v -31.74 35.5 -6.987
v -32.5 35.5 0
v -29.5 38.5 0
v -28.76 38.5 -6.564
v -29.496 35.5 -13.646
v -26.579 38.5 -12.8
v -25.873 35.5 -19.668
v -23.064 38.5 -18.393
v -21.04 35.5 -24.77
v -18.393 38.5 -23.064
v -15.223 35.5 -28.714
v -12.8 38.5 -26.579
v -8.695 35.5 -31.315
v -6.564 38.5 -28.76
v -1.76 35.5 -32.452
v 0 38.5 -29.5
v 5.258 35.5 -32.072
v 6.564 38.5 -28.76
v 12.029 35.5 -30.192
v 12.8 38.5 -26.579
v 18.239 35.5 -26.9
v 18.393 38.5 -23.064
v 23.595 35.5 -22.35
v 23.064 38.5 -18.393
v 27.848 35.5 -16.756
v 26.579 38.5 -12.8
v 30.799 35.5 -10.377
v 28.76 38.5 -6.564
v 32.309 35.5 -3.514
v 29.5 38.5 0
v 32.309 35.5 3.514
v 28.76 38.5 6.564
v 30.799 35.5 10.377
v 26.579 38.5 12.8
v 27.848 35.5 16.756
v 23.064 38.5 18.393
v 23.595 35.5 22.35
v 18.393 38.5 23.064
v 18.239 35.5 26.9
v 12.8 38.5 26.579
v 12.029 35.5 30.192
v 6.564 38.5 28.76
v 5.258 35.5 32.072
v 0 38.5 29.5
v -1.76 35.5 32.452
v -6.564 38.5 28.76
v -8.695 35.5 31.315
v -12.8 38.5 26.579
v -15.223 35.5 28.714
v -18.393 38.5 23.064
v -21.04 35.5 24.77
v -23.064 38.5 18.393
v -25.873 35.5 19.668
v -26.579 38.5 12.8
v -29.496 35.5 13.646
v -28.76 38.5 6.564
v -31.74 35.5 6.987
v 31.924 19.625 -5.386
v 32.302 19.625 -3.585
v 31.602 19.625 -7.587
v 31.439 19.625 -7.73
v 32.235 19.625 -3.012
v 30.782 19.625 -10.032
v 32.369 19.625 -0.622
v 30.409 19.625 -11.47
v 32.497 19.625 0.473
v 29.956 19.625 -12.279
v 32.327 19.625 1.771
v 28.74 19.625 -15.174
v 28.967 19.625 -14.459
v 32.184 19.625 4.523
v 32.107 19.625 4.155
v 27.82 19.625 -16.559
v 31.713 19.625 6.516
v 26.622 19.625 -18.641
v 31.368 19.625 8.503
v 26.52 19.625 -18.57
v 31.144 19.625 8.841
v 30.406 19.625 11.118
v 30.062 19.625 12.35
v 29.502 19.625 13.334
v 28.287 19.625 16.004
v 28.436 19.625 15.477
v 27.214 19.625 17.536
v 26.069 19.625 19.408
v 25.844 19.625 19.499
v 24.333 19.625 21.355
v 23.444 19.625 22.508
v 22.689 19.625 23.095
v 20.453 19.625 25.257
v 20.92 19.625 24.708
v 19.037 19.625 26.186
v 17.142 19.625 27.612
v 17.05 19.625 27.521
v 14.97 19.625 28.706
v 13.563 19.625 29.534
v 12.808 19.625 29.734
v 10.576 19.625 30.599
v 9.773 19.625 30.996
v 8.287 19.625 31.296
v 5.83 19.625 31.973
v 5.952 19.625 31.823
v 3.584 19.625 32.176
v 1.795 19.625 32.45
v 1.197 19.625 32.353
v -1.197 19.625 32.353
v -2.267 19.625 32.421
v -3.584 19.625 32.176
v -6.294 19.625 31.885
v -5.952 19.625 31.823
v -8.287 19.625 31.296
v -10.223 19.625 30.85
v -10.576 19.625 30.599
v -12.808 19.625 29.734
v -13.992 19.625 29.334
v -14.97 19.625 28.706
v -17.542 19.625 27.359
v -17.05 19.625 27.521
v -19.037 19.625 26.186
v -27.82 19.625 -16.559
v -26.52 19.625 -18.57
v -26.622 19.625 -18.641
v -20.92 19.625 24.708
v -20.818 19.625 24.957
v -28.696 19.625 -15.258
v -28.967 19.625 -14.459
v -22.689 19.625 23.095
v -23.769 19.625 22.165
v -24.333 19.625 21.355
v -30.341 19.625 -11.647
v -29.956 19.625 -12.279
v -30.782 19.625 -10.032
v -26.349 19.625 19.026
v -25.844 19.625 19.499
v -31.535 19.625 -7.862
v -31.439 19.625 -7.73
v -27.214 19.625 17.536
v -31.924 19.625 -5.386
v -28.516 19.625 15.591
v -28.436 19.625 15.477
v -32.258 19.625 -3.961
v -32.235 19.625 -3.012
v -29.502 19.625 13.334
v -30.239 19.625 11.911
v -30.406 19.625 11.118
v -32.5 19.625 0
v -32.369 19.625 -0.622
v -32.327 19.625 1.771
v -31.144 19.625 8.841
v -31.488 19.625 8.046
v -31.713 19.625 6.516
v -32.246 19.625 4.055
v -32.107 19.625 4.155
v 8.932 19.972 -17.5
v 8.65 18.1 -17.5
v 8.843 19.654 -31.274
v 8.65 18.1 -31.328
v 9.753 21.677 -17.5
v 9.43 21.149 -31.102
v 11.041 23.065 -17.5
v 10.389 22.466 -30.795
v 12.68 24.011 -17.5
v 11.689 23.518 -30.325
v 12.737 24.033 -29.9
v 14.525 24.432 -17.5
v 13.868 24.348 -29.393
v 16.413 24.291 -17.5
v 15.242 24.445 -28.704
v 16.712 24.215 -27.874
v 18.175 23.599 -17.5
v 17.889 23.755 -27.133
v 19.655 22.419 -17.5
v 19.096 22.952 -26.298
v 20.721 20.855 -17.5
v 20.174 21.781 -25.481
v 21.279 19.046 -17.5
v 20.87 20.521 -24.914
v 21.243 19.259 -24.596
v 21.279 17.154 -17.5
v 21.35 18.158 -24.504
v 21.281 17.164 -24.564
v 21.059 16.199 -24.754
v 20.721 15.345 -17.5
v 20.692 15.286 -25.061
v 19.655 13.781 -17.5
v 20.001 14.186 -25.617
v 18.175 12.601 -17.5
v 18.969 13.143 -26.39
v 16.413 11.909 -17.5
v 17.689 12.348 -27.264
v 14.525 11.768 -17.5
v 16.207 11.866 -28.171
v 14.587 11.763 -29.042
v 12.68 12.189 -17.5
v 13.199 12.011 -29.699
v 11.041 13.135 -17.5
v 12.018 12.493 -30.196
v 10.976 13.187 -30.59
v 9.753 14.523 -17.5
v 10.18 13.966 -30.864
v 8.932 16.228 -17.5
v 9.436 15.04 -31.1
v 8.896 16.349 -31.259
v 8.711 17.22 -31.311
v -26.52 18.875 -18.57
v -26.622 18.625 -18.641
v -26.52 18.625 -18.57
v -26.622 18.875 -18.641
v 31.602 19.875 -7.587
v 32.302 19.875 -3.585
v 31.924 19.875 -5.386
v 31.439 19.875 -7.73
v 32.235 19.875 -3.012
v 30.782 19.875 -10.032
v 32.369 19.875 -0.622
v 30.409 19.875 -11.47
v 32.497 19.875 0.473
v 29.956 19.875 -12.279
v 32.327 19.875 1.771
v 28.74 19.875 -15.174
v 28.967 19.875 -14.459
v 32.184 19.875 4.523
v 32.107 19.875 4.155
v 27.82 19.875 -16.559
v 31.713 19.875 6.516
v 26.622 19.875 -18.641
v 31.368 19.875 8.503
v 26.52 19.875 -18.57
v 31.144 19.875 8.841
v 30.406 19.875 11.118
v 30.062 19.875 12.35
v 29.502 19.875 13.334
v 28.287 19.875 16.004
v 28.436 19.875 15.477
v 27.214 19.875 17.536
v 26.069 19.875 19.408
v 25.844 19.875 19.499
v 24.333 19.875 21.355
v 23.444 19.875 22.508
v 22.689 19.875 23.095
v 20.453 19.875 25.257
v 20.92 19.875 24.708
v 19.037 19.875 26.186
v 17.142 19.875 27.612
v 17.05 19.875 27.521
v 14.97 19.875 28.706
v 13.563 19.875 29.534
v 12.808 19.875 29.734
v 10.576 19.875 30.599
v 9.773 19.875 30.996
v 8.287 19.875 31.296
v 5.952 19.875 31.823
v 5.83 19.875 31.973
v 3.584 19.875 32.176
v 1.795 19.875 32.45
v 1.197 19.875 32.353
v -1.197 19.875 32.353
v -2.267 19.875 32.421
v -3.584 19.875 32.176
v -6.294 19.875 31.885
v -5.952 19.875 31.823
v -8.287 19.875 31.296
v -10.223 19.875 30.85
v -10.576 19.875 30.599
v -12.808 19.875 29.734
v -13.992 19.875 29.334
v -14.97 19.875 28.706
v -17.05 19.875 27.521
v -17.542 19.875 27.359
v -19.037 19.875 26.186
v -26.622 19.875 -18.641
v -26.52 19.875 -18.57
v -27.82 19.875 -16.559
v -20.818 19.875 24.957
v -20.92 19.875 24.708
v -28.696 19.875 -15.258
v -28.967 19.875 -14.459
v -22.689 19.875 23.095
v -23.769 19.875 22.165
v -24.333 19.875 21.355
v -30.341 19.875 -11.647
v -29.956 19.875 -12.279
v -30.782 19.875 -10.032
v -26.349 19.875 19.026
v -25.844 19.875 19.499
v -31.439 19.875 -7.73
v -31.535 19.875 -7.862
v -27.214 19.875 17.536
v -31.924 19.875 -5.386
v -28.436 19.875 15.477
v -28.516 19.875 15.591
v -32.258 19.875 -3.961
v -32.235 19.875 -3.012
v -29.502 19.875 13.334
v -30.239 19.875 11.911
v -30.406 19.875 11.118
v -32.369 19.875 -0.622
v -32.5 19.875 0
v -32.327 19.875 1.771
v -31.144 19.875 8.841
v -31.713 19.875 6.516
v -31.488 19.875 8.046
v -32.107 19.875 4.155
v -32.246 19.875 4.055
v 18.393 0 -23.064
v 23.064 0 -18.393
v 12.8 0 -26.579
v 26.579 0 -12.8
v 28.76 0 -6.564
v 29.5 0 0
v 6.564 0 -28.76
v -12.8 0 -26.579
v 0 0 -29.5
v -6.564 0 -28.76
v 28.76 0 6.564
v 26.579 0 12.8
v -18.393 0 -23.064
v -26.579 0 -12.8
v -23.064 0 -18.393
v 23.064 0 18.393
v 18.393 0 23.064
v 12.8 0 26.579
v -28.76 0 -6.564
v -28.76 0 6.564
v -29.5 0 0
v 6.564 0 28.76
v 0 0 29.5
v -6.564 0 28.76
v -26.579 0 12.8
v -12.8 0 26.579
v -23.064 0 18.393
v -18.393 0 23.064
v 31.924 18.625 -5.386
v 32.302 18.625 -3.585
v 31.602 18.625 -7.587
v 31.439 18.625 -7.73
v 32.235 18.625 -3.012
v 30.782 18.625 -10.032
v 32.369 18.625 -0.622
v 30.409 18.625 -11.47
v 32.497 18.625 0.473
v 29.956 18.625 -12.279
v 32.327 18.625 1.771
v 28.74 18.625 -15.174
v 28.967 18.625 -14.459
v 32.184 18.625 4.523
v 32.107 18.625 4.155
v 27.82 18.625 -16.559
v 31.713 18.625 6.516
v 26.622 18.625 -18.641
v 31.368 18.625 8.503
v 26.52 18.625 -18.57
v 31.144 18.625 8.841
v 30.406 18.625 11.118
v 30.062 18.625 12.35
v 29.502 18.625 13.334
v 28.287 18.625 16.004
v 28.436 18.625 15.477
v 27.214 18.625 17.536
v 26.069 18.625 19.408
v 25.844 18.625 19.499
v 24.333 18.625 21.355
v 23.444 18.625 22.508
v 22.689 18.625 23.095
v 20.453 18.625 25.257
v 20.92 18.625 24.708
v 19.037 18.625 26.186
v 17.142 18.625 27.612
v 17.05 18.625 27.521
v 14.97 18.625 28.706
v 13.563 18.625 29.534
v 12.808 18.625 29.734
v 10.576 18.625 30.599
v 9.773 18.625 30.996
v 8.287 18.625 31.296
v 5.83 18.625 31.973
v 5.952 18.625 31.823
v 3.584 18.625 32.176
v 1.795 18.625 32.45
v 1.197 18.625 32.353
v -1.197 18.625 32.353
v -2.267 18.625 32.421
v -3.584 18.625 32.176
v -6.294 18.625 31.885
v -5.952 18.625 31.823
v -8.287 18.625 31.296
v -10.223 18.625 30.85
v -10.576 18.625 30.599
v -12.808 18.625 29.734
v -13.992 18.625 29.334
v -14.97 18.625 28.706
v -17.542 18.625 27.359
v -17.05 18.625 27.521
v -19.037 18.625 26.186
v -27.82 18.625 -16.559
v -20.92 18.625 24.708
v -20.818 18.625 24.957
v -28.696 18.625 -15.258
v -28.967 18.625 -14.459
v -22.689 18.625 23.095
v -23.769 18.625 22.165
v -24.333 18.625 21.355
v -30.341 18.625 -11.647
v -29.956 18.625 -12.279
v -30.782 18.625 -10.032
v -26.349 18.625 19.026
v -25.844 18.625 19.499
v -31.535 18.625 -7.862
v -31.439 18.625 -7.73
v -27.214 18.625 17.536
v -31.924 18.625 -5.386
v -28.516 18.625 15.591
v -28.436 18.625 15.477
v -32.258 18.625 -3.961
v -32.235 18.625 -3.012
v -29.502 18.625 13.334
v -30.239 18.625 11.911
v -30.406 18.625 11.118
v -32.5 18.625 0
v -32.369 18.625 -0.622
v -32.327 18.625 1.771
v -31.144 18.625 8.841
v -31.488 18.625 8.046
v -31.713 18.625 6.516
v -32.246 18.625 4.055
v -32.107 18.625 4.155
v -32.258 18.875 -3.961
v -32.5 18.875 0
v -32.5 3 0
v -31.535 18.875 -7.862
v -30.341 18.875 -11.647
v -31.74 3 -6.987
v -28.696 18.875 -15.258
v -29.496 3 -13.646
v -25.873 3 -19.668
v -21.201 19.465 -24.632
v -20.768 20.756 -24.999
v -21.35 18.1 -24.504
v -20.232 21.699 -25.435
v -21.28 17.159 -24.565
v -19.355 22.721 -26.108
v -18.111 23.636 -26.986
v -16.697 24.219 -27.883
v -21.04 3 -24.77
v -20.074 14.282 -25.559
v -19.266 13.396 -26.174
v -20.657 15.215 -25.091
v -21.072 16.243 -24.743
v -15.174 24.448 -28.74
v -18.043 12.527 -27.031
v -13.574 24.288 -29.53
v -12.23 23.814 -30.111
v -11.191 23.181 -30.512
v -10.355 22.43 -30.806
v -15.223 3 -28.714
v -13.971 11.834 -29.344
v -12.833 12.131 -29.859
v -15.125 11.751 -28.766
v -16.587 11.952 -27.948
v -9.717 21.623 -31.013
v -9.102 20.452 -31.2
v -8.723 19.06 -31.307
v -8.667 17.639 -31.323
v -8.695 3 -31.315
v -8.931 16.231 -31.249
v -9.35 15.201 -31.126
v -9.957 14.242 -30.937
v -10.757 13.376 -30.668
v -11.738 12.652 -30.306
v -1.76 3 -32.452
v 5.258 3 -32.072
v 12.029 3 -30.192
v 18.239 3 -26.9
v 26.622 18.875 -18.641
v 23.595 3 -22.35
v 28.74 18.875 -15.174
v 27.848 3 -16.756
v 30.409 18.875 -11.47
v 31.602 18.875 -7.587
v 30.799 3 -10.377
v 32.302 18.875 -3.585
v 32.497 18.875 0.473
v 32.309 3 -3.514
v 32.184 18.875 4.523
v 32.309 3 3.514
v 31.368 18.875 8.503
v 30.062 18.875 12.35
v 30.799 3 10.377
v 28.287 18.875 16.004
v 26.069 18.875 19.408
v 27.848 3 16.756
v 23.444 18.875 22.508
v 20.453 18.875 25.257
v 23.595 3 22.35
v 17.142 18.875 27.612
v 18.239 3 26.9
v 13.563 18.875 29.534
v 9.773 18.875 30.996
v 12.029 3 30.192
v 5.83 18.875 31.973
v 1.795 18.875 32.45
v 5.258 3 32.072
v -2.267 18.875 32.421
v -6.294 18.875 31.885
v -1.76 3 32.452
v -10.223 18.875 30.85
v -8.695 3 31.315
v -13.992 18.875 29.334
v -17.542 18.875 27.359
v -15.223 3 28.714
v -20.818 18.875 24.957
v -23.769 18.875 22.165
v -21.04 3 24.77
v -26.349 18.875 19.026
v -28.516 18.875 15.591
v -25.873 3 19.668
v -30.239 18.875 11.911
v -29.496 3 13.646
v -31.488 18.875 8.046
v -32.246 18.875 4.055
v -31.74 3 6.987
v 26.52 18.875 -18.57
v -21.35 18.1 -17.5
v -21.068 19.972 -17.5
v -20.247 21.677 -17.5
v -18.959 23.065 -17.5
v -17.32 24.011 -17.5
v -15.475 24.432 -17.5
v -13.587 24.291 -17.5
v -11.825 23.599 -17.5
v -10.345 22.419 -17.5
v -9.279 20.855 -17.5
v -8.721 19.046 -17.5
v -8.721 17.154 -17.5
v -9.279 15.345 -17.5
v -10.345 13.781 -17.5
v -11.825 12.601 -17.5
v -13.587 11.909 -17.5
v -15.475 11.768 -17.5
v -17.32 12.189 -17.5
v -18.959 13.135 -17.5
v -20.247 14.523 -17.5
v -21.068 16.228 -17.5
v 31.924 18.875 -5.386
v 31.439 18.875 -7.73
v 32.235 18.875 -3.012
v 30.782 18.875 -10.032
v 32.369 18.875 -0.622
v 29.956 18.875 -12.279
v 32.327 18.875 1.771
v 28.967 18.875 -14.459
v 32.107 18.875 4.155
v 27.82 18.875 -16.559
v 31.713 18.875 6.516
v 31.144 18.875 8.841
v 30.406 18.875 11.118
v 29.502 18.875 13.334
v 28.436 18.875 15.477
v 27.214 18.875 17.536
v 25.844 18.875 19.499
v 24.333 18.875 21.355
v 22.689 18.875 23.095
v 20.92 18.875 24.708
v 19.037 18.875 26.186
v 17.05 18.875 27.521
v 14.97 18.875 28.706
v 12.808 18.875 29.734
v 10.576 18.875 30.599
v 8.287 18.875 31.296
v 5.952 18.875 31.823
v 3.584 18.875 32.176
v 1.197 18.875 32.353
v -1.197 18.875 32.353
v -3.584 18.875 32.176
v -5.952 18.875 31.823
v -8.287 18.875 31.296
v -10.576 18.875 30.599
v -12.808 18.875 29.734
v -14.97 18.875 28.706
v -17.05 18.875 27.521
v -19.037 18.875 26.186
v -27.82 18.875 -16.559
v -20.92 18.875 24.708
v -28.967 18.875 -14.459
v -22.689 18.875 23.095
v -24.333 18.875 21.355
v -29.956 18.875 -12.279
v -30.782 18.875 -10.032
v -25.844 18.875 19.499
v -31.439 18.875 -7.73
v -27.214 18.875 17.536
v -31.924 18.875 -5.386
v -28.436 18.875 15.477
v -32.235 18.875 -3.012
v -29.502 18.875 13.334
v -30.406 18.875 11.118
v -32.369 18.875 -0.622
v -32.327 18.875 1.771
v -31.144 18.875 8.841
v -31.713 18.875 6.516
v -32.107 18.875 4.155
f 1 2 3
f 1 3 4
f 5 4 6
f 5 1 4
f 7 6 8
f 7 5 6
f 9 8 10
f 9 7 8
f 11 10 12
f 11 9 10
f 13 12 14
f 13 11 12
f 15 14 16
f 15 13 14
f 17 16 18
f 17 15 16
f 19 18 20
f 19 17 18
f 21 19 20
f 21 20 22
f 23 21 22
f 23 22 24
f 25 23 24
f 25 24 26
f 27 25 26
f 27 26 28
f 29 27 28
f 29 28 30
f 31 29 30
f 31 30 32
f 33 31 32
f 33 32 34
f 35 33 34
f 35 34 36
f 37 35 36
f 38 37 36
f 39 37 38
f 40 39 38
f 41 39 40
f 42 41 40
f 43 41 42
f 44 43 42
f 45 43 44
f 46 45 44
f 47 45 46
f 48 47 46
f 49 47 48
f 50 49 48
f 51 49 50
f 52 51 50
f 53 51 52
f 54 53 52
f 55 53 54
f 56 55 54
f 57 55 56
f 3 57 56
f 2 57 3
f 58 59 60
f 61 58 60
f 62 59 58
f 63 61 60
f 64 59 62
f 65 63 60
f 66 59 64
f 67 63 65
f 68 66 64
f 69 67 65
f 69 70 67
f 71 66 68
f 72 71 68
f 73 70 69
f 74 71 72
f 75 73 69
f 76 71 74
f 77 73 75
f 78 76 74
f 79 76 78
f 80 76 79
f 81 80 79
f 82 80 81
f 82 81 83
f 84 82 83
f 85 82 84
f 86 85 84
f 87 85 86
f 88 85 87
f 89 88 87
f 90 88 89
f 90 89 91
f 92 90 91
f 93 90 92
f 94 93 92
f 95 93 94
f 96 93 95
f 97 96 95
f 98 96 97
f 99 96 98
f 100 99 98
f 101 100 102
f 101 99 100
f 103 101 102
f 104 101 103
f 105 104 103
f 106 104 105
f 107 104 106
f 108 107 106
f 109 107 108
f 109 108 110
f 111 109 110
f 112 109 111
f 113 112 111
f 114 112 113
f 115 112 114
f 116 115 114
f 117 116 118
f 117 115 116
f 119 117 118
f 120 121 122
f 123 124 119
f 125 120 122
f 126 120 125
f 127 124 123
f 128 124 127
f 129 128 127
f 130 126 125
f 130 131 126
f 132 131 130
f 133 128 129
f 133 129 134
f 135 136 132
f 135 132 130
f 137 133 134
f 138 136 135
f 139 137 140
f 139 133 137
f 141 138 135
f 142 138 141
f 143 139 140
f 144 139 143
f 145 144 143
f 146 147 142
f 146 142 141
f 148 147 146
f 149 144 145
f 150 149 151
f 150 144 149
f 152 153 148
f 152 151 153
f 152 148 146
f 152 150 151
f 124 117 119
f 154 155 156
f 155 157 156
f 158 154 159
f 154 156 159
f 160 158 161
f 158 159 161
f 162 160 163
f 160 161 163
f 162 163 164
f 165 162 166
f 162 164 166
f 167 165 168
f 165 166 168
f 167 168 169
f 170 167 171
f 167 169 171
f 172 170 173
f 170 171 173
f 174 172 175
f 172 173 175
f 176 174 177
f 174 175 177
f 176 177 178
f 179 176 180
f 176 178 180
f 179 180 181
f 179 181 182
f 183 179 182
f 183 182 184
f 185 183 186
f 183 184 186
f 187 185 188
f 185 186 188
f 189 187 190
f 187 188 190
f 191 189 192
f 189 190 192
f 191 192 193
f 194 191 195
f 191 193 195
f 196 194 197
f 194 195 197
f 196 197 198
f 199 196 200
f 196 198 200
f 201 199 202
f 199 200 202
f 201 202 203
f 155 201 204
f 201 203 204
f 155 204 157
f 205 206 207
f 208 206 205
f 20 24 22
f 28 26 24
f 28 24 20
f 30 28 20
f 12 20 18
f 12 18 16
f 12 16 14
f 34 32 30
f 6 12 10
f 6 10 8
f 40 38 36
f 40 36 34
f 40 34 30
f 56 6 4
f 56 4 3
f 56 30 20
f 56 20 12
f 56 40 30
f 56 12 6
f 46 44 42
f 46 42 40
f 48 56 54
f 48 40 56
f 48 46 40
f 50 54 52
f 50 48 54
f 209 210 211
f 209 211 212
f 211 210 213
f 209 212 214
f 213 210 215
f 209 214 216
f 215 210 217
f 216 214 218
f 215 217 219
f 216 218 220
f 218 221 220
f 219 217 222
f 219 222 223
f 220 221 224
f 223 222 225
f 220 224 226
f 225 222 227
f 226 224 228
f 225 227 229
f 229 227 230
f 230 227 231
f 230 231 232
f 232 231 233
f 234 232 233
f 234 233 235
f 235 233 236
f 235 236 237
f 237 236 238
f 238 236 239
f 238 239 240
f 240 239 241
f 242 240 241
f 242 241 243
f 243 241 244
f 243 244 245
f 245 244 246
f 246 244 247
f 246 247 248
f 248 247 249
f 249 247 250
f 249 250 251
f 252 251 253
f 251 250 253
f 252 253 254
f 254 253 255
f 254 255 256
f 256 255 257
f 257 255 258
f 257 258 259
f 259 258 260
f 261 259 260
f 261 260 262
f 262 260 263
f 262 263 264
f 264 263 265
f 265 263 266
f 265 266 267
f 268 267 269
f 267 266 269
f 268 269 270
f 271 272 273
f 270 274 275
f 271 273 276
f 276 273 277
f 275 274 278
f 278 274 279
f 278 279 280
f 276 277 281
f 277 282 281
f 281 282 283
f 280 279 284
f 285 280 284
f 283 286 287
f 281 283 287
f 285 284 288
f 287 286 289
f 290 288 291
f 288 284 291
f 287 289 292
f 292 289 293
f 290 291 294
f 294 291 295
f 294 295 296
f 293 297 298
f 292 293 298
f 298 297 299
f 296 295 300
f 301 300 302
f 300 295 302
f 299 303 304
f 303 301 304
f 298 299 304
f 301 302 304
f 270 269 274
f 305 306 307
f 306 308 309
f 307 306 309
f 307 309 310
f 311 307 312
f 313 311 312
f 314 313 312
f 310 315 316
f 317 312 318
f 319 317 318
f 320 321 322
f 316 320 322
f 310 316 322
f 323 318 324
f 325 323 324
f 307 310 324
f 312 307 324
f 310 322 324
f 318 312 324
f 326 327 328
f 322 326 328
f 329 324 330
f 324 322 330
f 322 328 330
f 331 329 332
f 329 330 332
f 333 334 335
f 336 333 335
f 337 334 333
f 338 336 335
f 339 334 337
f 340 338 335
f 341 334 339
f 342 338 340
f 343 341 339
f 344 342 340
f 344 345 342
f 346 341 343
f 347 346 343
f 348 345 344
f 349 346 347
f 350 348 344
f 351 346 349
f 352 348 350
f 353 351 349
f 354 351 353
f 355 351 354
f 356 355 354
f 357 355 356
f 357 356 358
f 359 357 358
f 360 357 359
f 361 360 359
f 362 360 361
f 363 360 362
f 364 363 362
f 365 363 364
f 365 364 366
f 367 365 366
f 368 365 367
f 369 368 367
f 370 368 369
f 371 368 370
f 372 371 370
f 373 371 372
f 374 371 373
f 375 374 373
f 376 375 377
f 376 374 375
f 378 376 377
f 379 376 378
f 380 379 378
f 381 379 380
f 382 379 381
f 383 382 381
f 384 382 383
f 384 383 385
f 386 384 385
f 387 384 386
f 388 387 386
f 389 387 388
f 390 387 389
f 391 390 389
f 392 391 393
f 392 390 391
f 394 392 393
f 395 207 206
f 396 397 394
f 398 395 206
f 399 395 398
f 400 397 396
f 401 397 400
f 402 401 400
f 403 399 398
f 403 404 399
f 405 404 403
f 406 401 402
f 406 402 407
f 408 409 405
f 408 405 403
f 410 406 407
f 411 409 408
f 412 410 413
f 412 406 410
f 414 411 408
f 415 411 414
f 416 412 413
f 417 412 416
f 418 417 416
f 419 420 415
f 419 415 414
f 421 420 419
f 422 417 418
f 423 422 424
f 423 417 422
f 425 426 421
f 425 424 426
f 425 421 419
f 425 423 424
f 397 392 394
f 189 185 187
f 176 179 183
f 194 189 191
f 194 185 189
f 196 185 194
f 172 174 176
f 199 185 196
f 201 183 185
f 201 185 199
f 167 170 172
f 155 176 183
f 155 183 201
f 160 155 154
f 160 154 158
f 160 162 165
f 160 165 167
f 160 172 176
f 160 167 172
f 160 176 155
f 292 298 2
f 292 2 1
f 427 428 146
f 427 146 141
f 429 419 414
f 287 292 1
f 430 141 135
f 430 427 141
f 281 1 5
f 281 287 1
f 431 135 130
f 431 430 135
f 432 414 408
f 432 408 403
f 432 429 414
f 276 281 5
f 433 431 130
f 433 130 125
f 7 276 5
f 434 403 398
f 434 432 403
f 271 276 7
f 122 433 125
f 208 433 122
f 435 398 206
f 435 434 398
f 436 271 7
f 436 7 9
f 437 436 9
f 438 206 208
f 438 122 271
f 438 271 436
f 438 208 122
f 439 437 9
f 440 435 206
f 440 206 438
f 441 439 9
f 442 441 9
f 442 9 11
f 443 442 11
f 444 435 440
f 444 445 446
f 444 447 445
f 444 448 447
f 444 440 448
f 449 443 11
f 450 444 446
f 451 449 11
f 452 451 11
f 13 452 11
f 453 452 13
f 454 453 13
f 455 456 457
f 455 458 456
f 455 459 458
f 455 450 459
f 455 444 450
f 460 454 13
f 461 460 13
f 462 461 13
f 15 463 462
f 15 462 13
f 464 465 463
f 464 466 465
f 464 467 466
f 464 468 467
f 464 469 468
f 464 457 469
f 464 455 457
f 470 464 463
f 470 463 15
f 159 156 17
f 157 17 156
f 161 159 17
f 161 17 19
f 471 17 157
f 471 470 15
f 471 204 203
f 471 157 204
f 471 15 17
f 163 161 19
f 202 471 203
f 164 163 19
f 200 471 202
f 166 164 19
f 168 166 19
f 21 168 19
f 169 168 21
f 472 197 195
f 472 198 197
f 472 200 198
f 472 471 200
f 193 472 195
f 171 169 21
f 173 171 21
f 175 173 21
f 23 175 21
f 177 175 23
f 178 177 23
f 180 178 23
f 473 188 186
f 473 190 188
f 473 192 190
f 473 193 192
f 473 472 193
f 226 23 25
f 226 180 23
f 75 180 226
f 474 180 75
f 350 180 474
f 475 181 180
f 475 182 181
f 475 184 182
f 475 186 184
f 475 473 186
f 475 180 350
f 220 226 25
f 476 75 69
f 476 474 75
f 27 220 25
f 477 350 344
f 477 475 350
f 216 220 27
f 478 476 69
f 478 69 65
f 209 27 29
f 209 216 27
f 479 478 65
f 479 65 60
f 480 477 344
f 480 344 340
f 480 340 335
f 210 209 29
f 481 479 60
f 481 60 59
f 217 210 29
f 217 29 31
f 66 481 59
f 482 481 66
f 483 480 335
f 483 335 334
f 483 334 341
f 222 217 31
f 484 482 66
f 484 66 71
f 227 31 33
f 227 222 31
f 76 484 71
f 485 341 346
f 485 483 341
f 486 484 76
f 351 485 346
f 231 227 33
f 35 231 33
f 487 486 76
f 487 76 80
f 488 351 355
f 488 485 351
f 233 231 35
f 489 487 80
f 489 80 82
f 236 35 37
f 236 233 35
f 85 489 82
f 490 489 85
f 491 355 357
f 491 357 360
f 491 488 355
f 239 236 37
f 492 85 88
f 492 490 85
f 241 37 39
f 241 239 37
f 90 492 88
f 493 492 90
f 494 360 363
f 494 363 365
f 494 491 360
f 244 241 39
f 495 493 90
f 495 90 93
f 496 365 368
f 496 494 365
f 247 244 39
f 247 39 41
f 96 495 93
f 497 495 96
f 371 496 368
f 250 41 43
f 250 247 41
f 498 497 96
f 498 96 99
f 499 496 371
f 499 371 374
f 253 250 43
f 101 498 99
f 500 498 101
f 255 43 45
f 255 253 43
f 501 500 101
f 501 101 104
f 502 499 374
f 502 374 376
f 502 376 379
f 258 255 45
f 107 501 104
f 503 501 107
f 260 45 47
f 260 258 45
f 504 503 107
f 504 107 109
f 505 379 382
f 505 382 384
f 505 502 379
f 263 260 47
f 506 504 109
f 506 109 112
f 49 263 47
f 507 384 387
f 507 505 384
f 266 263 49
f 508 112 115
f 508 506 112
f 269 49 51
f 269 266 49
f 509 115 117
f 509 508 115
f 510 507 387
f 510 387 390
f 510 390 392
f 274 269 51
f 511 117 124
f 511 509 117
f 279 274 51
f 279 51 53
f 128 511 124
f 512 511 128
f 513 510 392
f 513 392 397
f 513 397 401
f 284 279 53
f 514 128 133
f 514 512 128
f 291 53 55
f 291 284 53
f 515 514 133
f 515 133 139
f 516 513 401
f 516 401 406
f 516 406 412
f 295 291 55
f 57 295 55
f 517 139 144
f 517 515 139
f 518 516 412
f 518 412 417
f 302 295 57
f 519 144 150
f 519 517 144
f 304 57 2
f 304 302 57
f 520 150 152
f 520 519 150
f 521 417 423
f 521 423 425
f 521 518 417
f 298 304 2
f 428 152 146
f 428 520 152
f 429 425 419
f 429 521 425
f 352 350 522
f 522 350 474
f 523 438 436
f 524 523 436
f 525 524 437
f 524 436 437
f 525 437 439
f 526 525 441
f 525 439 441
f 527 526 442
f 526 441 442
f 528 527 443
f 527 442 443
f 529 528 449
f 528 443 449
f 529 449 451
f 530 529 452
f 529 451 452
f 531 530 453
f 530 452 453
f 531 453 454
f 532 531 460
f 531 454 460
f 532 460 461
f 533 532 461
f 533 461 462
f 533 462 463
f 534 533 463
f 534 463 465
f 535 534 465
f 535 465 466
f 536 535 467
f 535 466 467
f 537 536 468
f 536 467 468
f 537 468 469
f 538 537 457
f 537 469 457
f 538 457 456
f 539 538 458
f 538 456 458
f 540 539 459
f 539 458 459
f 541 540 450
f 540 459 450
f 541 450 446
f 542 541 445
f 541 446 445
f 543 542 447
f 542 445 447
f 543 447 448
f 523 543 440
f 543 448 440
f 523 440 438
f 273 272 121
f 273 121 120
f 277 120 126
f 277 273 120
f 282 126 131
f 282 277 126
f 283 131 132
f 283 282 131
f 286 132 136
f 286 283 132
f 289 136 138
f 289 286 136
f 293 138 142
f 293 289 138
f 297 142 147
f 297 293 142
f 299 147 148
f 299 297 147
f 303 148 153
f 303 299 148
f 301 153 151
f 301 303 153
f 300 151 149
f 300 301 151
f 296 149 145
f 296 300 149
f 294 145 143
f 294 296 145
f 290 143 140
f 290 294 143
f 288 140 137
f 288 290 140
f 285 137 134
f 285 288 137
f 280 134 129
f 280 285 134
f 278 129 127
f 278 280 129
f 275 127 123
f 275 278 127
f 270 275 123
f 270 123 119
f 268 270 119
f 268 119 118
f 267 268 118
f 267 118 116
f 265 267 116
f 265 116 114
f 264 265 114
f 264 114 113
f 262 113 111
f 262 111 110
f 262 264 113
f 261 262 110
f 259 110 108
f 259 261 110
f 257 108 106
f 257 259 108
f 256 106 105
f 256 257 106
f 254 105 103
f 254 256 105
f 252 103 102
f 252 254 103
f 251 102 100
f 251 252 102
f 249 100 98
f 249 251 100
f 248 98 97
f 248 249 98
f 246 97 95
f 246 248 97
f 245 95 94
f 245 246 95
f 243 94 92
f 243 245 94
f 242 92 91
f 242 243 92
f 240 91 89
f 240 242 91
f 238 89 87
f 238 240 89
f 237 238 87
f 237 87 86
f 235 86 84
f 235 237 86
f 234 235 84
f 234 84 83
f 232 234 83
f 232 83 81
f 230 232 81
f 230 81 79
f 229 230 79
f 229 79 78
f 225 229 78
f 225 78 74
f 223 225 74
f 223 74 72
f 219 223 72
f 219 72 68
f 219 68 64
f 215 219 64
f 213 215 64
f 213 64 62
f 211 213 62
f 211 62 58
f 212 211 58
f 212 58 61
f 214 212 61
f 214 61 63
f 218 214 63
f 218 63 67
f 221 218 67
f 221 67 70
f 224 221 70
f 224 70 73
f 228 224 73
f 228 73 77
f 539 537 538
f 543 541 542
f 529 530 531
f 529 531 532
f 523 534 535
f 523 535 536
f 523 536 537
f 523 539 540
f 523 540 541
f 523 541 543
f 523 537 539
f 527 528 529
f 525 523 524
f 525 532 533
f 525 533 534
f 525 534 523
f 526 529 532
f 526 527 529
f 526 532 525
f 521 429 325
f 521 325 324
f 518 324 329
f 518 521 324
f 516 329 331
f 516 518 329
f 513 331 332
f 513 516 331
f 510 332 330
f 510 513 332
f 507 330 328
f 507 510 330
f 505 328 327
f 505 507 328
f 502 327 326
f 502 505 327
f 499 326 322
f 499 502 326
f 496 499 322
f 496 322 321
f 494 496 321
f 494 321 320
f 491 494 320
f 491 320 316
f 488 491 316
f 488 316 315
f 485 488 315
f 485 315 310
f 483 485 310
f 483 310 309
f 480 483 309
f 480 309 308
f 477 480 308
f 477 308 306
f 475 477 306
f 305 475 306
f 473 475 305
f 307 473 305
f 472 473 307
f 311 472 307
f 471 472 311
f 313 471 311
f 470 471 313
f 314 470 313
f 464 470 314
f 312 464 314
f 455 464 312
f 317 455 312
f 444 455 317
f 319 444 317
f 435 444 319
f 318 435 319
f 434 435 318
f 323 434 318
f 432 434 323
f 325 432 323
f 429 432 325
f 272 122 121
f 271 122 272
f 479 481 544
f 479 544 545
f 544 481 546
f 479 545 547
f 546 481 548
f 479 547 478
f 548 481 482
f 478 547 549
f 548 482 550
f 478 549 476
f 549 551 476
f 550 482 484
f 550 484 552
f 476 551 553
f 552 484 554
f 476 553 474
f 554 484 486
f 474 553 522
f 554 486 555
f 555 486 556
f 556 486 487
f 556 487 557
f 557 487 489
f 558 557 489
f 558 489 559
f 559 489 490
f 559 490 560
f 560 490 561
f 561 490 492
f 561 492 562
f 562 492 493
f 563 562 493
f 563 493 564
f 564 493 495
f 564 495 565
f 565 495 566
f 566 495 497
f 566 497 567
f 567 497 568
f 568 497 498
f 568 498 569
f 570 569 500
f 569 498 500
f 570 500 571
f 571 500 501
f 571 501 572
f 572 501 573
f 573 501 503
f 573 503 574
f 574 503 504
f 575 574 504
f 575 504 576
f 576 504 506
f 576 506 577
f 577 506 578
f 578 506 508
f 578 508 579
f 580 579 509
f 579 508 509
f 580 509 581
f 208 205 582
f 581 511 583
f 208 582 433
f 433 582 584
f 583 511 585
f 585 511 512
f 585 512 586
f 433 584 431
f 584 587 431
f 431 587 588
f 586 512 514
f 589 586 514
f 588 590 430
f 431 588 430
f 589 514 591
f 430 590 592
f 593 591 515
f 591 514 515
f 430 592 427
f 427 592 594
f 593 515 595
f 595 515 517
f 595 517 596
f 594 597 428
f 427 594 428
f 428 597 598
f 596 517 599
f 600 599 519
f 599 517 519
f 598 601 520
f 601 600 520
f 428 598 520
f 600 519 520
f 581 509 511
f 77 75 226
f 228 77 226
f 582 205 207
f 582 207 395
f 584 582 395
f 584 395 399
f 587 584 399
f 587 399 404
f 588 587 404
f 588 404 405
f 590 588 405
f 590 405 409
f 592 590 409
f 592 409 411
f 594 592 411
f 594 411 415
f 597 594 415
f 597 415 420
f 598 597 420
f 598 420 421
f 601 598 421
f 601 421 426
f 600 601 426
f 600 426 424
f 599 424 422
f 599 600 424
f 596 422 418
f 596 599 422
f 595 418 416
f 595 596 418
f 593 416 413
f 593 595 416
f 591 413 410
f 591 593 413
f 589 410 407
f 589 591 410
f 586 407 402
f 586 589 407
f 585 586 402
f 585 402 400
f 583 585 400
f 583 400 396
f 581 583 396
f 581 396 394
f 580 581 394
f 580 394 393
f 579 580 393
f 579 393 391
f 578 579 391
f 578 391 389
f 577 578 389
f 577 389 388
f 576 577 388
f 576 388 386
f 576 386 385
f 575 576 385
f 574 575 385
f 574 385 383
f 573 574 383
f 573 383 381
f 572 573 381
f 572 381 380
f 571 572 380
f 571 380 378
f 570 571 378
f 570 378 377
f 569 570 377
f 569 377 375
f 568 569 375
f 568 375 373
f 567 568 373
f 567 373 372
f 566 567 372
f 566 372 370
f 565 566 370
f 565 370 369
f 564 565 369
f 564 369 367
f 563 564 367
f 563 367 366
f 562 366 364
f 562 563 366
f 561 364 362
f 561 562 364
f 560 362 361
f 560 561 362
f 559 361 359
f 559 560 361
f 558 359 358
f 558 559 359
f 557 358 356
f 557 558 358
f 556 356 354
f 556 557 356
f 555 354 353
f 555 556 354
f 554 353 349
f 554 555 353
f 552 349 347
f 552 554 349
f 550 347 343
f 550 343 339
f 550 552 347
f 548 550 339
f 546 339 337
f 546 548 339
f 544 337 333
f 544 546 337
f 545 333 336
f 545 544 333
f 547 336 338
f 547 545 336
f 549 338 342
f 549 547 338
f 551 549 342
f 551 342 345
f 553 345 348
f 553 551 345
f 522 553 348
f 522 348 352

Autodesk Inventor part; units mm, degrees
ref_plane "YZ Plane" through (0, 0, 0) normal (1, 0, 0) x (0, 1, 0)
ref_plane "XZ Plane" through (0, 0, 0) normal (0, 1, 0) x (-1, 0, 0)
sketch "Sketch1" plane through (0, 0, 0) normal (0, 1, 0) x (-1, 0, 0)
  circle A0 centre (0, 0) radius 32.5
  dimension "d0" = 65
extrude "Extrusion1" add sketch "Sketch1" along normal blind 38.5
sketch "Sketch2" plane through (0, 0, 0) normal (0, -1, 0) x (1, 0, 0)
  circle A0 centre (0, 0) radius 25.5
  dimension "d3" = 51
extrude "Extrusion2" add sketch "Sketch2" along normal blind 23.4
chamfer "Chamfer1" distance 3 angle 45 2 edges at (32.5, 38.5, 0) (32.5, 0, 0)
sketch "Sketch3" plane through (0, -23.4, 0) normal (0, -1, 0) x (1, 0, 0)
  line L0 (0, 0) -> (0, -10.5) construction
  circle A0 centre (0, 0) radius 25.5 projected
  line L1 (0, -10.5) -> (5.75, -10.5)
  line L2 (5.75, -10.5) -> (5.75, -24.8433)
  line L3 (0, -10.5) -> (-5.75, -10.5)
  line L4 (-5.75, -10.5) -> (-5.75, -24.8433)
  line L5 (5.75, -24.8433) -> (-5.75, -24.8433)
  line L6 (-15, 15) -> (15, 15) construction
  line L7 (15, 15) -> (15, -15) construction
  line L8 (15, -15) -> (-15, -15) construction
  line L9 (-15, -15) -> (-15, 15) construction
  line L10 (-15, 15) -> (15, -15) construction
  line L11 (15, 15) -> (-15, -15) construction
  line L12 (5.65, 5.65) -> (-5.65, 5.65) construction
  line L13 (-5.65, 5.65) -> (-5.65, -5.65) construction
  line L14 (-5.65, -5.65) -> (5.65, -5.65) construction
  line L15 (5.65, -5.65) -> (5.65, 5.65) construction
  line L16 (5.65, 5.65) -> (-5.65, -5.65) construction
  line L17 (-5.65, 5.65) -> (5.65, -5.65) construction
  dimension "d10" = 10.5
  dimension "d14" = 5.75
  dimension "d15" = 5.75
  dimension "d16" = 30
  dimension "d17" = 30
  dimension "d35" = 11.3
  dimension "d36" = 11.3
hole "Hole1" at (15, -23.4, -15) at (-15, -23.4, -15) at (15, -23.4, 15) at (-15, -23.4, 15) direction (0, 1, 0) diameter 2.5 depth 4 tip angle 118
thread "Thread1" size "M2.5x0.45" class "6H" standard "ANSI Metric M Profile" full length
thread "Thread2" size "M2.5x0.45" class "6H" standard "ANSI Metric M Profile" full length
thread "Thread3" size "M2.5x0.45" class "6H" standard "ANSI Metric M Profile" full length
thread "Thread4" size "M2.5x0.45" class "6H" standard "ANSI Metric M Profile" full length
extrude "Extrusion3" cut sketch "Sketch3" against normal blind 12 contours L5 A0 | L4 L3 L1 L2 L5
hole "Hole2" at (5.65, -23.4, 5.65) at (5.65, -23.4, -5.65) at (-5.65, -23.4, 5.65) at (-5.65, -23.4, -5.65) direction (0, 1, 0) diameter 2.1 depth 3 tip angle 118
thread "Thread5" size "M2.5x0.45" class "6H" standard "ANSI Metric M Profile" full length
thread "Thread6" size "M2.2x0.45" class "6H" standard "ANSI Metric M Profile" full length
thread "Thread7" size "M2.2x0.45" class "6H" standard "ANSI Metric M Profile" full length
thread "Thread8" size "M2.2x0.45" class "6H" standard "ANSI Metric M Profile" full length
ref_plane "Work Plane1" through (0, 0, -32.5) normal (0, 0, -1) x (-1, 0, 0)
sketch "Sketch4" plane through (0, 0, -32.5) normal (0, 0, -1) x (-1, 0, 0)
  line L0 (-25.5, -23.4) -> (25.5, -23.4) projected
  line L1 (-32.5, 3) -> (32.5, 3) projected
  line L2 (32.5, 35.5) -> (-32.5, 35.5) projected
  line L3 (0, -23.4) -> (0, 18.1) construction
  line L4 (32.5, 3) -> (32.5, 35.5) projected
  line L5 (-32.5, 3) -> (-32.5, 35.5) projected
  line L6 (32.5, 17.6) -> (32.5, 18.6)
  line L7 (-20, 18.1) -> (20, 18.1) construction
  line L8 (0, 18.1) -> (-15, 18.1)
  line L9 (0, 18.1) -> (15, 18.1)
  circle A0 centre (-15, 18.1) radius 6.35
  circle A1 centre (15, 18.1) radius 6.35
  point P0 (0, 0)
  point P1 (-5.75, -23.4)
  point P2 (5.75, -23.4)
  dimension "d52" = 41.5
  dimension "d53" = 1
  dimension "d54" = 20
  dimension "d56" = 15
  dimension "d57" = 15
  dimension "d58" = 12.7
  dimension "d59" = 12.7
extrude "Extrusion5" cut sketch "Sketch4" against normal blind 15 contours A0 | A1
sketch "Sketch6" plane through (0, 0, 0) normal (1, 0, 0) x (0, 1, 0)
  line L0 (3, 32.5) -> (35.5, 32.5) projected
  line L1 (35.5, 32.5) -> (19.25, 32.5)
  line L2 (19.25, 32.5) -> (19.75, 32.5)
  line L3 (19.25, 32.5) -> (18.75, 32.5)
  line L4 (18.875, 32.625) -> (18.625, 32.625)
  line L5 (18.625, 32.625) -> (18.625, 32.375)
  line L6 (18.625, 32.375) -> (18.875, 32.375)
  line L7 (18.875, 32.375) -> (18.875, 32.625)
  line L8 (18.875, 32.625) -> (18.625, 32.375) construction
  line L9 (18.625, 32.625) -> (18.875, 32.375) construction
  line L10 (19.875, 32.625) -> (19.625, 32.625)
  line L11 (19.625, 32.625) -> (19.625, 32.375)
  line L12 (19.625, 32.375) -> (19.875, 32.375)
  line L13 (19.875, 32.375) -> (19.875, 32.625)
  line L14 (19.875, 32.625) -> (19.625, 32.375) construction
  line L15 (19.625, 32.625) -> (19.875, 32.375) construction
  line L16 (-35.78, 0) -> (50.88, 0) projected
  point P0 (0, 0)
  dimension "d83" = 16.25
  dimension "d84" = 0.5
  dimension "d85" = 0.5
  dimension "d86" = 0.25
  dimension "d87" = 0.25
  dimension "d88" = 0.25
  dimension "d89" = 0.25
revolve "Revolution4" cut sketch "Sketch6" angle 250 mid plane about axis through (0, -10, 0) along (0, 1, 0)
ref_plane "Work Plane2" through (0, 0, 0) normal (0, -1, 0) x (1, 0, 0)
split body "Split1" result two bodies by plane through (0, 0, 0) normal (0, -1, 0) first body at (-14.161, -15.6, -20.6026)
split "Split2" plane through (0, 0, 0) removes the side toward (0, -1, 0)
properties part number "SweepV0.991_HEAD_Rev.1" material "LCP Plastic"
